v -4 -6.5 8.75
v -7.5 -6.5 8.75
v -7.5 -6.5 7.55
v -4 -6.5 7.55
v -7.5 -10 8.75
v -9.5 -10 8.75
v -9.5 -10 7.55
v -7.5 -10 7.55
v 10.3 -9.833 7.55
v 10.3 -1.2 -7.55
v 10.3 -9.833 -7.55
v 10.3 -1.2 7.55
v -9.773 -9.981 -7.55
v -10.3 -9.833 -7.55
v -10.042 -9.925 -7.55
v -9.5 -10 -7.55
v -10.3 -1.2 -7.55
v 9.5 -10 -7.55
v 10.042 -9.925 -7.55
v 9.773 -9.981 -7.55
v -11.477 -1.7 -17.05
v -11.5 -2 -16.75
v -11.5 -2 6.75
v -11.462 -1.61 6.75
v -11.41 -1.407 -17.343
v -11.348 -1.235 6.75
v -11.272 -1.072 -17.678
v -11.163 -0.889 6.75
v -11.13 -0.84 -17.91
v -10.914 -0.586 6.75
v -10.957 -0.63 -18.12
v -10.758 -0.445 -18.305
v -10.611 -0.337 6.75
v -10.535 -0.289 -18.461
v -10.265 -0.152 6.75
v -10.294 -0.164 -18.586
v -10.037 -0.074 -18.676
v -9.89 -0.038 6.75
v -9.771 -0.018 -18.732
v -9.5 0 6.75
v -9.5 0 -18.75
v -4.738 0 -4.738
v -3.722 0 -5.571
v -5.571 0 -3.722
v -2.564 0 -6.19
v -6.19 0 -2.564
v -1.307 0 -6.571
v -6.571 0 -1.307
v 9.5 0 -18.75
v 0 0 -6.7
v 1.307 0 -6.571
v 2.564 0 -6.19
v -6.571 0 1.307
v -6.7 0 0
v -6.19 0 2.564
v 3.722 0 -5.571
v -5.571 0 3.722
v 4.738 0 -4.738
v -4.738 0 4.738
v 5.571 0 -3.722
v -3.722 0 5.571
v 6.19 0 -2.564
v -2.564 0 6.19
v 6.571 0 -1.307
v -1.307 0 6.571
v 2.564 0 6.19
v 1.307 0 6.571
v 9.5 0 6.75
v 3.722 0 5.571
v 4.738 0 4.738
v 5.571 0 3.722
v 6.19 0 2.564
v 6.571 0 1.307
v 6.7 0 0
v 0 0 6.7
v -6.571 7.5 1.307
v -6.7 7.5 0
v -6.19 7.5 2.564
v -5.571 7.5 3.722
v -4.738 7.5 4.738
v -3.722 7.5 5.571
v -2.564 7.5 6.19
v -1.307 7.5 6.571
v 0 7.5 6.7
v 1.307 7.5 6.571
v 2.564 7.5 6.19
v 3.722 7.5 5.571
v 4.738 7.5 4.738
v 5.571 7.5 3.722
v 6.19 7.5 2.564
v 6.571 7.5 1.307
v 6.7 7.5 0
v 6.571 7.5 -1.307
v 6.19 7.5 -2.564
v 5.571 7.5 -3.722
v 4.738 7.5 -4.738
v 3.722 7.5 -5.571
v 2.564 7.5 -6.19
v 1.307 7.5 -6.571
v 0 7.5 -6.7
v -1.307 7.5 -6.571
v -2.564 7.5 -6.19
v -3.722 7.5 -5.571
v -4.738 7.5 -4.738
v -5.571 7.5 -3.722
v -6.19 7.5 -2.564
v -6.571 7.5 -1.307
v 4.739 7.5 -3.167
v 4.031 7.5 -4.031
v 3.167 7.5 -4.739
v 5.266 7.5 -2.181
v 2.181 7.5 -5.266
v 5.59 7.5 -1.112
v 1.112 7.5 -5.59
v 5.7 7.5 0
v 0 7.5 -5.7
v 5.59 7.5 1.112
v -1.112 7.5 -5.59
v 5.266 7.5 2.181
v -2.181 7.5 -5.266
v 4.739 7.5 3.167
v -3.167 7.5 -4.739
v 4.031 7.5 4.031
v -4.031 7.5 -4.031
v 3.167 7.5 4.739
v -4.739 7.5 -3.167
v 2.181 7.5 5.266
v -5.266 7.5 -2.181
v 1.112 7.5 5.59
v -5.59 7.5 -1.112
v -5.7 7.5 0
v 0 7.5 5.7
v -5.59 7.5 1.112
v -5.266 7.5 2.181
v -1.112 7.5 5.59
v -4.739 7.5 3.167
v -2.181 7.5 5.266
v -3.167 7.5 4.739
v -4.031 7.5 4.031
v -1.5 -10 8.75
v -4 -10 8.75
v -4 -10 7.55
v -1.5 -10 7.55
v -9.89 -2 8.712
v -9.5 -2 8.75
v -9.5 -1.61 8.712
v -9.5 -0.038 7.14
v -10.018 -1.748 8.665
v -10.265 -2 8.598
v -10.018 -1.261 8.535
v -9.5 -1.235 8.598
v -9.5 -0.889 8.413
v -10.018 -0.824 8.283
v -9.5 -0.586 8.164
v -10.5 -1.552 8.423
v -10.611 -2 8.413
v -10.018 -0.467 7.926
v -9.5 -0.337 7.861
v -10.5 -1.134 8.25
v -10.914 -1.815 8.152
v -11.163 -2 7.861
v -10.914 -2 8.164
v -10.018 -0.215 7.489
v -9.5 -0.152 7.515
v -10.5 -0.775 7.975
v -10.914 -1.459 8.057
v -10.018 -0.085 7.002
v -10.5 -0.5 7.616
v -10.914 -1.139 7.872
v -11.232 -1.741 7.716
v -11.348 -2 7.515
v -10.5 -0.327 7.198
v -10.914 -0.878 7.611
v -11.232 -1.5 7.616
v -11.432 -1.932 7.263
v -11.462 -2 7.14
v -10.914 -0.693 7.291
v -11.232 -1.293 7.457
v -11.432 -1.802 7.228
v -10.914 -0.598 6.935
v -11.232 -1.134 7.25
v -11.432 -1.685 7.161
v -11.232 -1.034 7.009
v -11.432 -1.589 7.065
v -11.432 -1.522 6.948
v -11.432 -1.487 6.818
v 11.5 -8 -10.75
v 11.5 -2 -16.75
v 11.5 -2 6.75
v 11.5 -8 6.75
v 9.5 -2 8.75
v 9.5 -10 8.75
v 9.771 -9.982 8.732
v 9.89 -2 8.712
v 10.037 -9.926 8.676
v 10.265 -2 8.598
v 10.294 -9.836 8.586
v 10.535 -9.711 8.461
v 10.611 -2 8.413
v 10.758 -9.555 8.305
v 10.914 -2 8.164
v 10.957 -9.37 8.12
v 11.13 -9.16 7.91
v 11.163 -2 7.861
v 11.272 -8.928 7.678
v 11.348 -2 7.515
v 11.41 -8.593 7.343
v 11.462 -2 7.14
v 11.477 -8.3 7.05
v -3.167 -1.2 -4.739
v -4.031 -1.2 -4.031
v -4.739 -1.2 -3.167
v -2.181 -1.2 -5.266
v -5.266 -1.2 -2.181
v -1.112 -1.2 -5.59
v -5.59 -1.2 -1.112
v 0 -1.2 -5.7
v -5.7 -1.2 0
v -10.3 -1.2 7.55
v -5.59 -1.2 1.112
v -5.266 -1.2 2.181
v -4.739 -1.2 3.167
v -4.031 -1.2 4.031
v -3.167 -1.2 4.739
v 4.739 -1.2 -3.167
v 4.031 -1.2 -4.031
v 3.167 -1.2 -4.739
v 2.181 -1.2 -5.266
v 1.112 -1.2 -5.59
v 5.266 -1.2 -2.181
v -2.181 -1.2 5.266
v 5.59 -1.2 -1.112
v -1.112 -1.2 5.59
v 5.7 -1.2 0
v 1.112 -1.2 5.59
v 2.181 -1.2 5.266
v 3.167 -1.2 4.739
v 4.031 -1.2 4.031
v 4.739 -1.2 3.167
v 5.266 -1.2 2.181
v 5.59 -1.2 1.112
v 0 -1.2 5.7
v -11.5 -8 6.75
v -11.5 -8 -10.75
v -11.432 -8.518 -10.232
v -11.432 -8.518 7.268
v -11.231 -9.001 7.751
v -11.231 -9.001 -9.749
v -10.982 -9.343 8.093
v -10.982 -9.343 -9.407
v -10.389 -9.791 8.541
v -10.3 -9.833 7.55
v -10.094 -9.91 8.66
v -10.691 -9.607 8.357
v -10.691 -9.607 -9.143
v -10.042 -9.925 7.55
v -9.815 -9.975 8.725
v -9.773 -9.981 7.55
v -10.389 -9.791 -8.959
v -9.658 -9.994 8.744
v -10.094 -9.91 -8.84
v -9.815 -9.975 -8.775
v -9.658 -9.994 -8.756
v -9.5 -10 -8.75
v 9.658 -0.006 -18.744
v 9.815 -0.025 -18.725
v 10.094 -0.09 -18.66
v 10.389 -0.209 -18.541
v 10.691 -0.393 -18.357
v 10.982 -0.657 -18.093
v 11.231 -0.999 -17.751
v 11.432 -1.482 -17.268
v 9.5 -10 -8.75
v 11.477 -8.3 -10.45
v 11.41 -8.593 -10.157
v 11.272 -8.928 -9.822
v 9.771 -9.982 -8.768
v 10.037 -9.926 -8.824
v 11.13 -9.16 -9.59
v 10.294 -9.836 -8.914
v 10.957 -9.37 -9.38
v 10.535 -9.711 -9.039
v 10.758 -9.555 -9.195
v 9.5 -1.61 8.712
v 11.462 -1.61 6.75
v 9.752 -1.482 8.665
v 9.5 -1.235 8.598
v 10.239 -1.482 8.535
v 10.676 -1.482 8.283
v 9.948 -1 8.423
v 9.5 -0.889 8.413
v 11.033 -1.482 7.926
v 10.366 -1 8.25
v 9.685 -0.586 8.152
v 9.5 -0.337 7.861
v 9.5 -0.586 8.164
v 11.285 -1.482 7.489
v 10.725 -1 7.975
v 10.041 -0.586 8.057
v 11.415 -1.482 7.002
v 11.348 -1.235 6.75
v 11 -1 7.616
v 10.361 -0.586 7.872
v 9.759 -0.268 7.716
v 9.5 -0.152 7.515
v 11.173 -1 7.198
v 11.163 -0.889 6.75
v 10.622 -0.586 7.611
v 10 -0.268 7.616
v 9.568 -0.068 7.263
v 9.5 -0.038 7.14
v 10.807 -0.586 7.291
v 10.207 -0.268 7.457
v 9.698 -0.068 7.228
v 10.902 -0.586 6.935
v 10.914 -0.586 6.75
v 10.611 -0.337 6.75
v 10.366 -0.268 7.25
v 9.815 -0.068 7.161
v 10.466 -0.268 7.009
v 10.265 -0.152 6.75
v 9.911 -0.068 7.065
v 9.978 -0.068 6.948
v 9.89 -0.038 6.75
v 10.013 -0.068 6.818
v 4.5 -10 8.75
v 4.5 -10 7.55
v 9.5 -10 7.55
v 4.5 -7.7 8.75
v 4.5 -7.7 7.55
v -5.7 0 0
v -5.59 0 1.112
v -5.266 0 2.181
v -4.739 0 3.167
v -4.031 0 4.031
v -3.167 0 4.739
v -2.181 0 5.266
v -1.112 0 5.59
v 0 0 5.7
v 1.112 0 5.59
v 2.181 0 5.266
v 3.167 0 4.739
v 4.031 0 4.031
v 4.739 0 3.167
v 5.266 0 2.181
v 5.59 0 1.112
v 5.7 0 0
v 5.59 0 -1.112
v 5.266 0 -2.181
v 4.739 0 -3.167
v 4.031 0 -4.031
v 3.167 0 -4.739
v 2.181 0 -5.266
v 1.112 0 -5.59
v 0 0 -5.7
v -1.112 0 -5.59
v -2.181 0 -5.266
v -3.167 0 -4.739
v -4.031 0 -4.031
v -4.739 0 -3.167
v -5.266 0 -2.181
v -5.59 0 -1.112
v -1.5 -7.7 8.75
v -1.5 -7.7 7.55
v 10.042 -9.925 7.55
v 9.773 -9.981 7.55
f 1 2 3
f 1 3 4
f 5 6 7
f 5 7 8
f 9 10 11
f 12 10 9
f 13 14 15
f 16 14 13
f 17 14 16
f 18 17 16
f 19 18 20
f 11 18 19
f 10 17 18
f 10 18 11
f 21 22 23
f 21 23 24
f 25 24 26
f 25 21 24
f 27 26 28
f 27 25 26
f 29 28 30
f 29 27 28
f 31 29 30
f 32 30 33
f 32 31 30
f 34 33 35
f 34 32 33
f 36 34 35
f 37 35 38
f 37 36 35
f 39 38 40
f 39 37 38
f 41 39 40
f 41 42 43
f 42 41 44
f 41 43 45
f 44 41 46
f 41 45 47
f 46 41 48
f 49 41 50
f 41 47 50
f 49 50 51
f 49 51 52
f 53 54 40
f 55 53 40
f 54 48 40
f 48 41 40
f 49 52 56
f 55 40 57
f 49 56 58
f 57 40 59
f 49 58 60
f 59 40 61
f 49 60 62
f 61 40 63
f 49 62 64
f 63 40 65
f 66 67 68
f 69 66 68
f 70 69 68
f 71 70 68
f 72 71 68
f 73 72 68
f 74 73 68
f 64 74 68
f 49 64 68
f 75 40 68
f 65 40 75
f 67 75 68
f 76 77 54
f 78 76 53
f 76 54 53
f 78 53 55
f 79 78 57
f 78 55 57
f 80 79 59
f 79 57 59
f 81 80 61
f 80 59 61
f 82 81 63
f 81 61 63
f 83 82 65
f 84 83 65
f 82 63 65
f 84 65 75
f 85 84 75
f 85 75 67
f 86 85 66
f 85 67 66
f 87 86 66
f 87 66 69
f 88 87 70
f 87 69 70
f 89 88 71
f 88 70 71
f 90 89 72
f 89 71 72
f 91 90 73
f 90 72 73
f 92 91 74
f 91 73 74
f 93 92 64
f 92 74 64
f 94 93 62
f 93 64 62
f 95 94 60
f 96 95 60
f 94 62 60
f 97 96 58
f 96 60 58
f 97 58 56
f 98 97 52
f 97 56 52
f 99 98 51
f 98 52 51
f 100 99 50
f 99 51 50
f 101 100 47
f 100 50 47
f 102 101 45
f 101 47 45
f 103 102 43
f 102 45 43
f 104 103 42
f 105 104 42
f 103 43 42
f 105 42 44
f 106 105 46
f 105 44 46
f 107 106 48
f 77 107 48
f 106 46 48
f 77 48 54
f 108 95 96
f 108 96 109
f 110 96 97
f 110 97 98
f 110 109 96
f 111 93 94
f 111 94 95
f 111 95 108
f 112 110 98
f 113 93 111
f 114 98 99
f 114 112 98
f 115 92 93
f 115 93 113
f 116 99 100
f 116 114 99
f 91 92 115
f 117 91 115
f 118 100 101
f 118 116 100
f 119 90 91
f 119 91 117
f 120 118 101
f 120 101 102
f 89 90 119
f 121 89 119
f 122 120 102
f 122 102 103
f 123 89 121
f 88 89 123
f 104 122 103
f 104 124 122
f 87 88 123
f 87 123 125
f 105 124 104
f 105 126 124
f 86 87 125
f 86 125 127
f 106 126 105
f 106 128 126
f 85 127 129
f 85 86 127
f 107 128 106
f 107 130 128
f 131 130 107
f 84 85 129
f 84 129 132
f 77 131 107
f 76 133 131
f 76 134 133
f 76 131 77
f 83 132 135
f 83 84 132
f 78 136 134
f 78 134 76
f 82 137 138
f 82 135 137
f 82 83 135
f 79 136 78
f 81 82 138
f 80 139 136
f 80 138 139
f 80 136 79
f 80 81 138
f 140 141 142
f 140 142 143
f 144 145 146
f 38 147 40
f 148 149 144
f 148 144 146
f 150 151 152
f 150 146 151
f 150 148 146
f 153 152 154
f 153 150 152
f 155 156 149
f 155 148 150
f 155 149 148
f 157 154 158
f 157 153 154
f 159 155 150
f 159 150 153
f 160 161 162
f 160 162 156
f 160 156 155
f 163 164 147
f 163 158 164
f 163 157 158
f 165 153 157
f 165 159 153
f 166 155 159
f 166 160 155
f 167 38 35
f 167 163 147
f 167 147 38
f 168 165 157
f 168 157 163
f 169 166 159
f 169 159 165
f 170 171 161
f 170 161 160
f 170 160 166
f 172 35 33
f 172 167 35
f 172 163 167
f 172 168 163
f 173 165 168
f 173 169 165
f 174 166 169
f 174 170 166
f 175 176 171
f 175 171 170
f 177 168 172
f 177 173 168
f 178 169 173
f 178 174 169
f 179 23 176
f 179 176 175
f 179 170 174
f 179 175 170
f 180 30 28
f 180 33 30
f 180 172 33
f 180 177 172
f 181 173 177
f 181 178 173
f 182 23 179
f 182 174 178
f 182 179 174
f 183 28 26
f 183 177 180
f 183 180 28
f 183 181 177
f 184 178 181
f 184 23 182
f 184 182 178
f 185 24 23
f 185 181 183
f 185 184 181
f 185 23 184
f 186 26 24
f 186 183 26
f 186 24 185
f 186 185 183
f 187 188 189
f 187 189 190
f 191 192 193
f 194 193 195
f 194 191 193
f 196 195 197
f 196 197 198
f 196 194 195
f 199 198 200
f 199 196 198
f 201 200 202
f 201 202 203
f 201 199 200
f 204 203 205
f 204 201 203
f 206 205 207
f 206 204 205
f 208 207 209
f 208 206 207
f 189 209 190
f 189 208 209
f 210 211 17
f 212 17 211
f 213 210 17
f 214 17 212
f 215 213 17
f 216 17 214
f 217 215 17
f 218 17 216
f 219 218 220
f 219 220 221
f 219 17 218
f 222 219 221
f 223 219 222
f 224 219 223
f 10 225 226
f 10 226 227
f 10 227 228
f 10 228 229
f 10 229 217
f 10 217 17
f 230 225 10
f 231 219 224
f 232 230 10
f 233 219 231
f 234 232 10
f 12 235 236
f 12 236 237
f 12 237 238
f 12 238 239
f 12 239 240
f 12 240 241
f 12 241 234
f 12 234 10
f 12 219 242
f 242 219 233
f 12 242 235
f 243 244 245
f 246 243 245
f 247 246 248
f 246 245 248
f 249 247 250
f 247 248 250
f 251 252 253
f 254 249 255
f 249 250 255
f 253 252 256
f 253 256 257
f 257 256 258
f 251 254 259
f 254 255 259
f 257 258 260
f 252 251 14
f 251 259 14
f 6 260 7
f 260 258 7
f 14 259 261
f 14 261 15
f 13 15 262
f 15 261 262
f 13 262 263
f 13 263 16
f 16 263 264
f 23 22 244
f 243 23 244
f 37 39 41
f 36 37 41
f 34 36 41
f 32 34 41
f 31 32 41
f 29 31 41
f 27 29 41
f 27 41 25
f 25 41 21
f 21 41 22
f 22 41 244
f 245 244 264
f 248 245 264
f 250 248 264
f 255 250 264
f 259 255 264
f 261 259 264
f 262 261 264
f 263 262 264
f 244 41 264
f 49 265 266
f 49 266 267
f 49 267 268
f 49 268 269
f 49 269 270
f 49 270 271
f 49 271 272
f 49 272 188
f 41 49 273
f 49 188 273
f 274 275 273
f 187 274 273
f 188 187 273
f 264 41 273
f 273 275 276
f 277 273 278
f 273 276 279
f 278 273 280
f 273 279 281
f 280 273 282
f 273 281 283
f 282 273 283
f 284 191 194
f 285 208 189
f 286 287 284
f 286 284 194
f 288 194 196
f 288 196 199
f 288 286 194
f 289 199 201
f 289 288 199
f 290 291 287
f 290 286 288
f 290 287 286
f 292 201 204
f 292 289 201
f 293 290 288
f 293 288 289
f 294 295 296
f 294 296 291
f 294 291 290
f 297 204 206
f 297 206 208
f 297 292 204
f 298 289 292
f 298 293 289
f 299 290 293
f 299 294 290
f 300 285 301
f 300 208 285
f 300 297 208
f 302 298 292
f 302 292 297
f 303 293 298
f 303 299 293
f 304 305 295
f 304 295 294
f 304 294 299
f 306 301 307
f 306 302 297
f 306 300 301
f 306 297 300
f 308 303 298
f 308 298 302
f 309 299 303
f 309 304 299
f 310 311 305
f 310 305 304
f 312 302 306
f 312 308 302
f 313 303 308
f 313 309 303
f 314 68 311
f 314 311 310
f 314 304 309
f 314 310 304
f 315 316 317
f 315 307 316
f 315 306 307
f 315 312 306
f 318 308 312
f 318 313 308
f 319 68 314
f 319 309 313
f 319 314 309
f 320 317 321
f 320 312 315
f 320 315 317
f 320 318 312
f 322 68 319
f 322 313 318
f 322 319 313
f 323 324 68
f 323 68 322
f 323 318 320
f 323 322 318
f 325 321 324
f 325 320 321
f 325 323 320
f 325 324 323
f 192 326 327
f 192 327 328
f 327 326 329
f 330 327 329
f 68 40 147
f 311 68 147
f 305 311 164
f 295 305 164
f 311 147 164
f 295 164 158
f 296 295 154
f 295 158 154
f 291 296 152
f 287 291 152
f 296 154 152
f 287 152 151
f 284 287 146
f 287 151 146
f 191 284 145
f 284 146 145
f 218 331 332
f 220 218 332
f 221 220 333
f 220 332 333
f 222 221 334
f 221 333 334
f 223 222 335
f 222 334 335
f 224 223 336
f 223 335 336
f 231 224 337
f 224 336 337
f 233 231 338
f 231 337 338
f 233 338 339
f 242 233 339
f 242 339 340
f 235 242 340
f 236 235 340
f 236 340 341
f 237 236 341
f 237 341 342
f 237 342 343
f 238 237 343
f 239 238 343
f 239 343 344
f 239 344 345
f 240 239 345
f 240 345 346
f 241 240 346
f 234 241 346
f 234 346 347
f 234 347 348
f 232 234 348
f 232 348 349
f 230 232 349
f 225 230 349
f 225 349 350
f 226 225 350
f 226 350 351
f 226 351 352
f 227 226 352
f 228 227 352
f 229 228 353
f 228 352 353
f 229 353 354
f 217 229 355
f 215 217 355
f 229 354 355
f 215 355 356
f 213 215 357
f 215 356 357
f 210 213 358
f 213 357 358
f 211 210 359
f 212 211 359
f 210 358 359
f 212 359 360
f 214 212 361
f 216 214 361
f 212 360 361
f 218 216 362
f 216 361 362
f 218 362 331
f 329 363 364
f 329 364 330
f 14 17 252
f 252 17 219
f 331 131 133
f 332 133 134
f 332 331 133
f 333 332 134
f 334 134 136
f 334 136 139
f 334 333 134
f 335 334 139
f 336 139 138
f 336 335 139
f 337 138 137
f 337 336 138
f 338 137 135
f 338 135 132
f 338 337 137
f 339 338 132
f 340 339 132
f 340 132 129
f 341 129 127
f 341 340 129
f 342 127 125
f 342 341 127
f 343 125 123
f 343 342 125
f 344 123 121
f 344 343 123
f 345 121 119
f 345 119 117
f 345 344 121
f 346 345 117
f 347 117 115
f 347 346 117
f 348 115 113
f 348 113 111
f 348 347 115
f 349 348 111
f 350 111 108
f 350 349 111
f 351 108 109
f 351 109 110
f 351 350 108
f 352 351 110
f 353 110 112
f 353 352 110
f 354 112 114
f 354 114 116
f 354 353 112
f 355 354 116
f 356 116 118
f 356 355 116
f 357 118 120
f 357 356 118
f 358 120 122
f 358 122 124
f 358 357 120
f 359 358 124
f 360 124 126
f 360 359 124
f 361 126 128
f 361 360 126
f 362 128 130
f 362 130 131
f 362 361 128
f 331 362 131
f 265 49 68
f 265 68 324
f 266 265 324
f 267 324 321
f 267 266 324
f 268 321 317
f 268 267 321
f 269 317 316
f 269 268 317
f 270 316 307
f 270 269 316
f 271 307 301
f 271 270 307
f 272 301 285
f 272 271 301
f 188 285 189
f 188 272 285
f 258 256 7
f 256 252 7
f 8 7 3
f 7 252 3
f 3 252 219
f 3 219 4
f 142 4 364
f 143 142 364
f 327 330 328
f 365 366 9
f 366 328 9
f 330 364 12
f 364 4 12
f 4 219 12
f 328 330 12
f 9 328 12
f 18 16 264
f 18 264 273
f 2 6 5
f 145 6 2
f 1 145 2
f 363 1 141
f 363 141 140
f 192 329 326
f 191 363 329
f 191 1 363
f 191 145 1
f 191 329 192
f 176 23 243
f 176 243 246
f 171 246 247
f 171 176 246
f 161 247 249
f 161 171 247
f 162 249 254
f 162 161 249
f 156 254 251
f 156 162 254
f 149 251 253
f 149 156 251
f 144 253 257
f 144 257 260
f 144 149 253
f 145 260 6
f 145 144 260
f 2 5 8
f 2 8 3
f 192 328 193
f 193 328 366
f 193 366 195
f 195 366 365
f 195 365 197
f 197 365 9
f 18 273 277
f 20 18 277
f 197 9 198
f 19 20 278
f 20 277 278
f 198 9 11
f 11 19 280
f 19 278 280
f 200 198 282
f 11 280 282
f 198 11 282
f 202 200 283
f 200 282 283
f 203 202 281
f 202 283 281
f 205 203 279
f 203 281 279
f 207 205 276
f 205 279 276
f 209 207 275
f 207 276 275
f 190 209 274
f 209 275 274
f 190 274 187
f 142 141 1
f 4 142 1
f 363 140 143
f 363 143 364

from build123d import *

# Parameters (mm, degrees)
F0_W          = 23
F0_H          = 17.5
F1_DEPTH      = 10
F2_T          = -1.2
F3_R          = 5.7
F4_DEPTH      = 3
F3_R_2        = 6.7
F5_DEPTH      = 7.5
F6_W          = 6
F6_H          = 2.3
F6_W_2        = 3.5
F6_H_2        = 3.5
F7_DEPTH      = 4
F8_DEPTH      = 10
F10_DEPTH     = 30
F11_T1_DEPTH  = 19
F11_T3_DEPTH  = 30.5
F11_T5_DEPTH  = 13
F11_T7_DEPTH  = 27.5
F11_S11_W     = 2
F11_S11_H     = 2
F11_T12_DEPTH = 2
F11_S17_W     = 2
F11_S17_H     = 2
F11_T18_DEPTH = 2


# Not quite as in the source:
# - a fillet or chamfer that OpenCascade refuses, or shapes differently, is made with other operations: its cross-section is extruded or revolved along the edge and cut away or added


with BuildPart() as f1:
    # F0 (on Front) → F1 (new body)
    with BuildSketch(Plane.XZ):
        Rectangle(F0_W, F0_H)
    extrude(amount=F1_DEPTH)

    # F2
    f2_openings = [f1.faces().sort_by_distance(p)[0] for p in [
        (0, -10, 0),
    ]]
    offset(amount=F2_T, openings=f2_openings)

    # F3 (on face) → F4 (cut)
    with BuildSketch(Plane(origin=(0, 0, 0), x_dir=(-1, 0, 0), z_dir=(0, 1, 0))):
        Circle(F3_R)
    extrude(amount=-F4_DEPTH, mode=Mode.SUBTRACT)

    # F3 (on face) → F5 (join)
    with BuildSketch(Plane(origin=(0, 0, 0), x_dir=(-1, 0, 0), z_dir=(0, 1, 0))):
        Circle(F3_R_2)
        Circle(F3_R, mode=Mode.SUBTRACT)
    extrude(amount=F5_DEPTH)

    # F6 (on face) → F7 (cut)
    with BuildSketch(Plane.XY.offset(8.75)):
        with Locations((1.5, -8.85)):
            Rectangle(F6_W, F6_H)
        with Locations((-5.75, -8.25)):
            Rectangle(F6_W_2, F6_H_2)
    extrude(amount=-F7_DEPTH, mode=Mode.SUBTRACT)

    # F8 (add): a face of the model
    f8_faces = [f1.faces().sort_by_distance(p)[0] for p in [
        (0, -5, -8.75),
    ]]
    extrude(f8_faces, amount=F8_DEPTH)

    # F9 (on face) → F10 (cut)
    with BuildSketch(Plane.YZ.offset(11.5)):
        Polygon((-10, -18.75), (0, -18.75), (-10, -8.75), align=None)
    extrude(amount=-F10_DEPTH, mode=Mode.SUBTRACT)

    # F11: fillet of radius 2 on 7 edges, made by hand

    # F11_s2 → F11_t1 (cut)
    with BuildSketch(Plane.YZ.offset(-9.5)):
        with BuildLine():
            ThreePointArc((0, 6.75), (-0.5857864376, 8.1642135624), (-2, 8.75))
            Line((-2, 8.75), (0, 8.75))
            Line((0, 8.75), (0, 6.75))
        make_face()
    extrude(amount=F11_T1_DEPTH, mode=Mode.SUBTRACT)

    # F11_s4 → F11_t3 (cut)
    with BuildSketch(Plane.XY.offset(-23.75)):
        with BuildLine():
            ThreePointArc((-11.5, -2), (-10.9142135624, -0.5857864376), (-9.5, 0))
            Line((-9.5, 0), (-11.5, 0))
            Line((-11.5, 0), (-11.5, -2))
        make_face()
        with BuildLine():
            ThreePointArc((9.5, 0), (10.9142135624, -0.5857864376), (11.5, -2))
            Line((11.5, -2), (11.5, 0))
            Line((11.5, 0), (9.5, 0))
        make_face()
    extrude(amount=F11_T3_DEPTH, mode=Mode.SUBTRACT)

    # F11_s6 → F11_t5 (cut)
    with BuildSketch(Plane.XZ.offset(2)):
        with BuildLine():
            ThreePointArc((9.5, 8.75), (10.9142135624, 8.1642135624), (11.5, 6.75))
            Line((11.5, 6.75), (11.5, 8.75))
            Line((11.5, 8.75), (9.5, 8.75))
        make_face()
        with BuildLine():
            ThreePointArc((-11.5, 6.75), (-10.9142135624, 8.1642135624), (-9.5, 8.75))
            Line((-9.5, 8.75), (-11.5, 8.75))
            Line((-11.5, 8.75), (-11.5, 6.75))
        make_face()
    extrude(amount=F11_T5_DEPTH, mode=Mode.SUBTRACT)

    # F11_s8 → F11_t7 (cut)
    with BuildSketch(Plane.XY.offset(-13.75)):
        with BuildLine():
            ThreePointArc((9.5, -10), (10.9142135624, -9.4142135624), (11.5, -8))
            Line((11.5, -8), (11.5, -10))
            Line((11.5, -10), (9.5, -10))
        make_face()
        with BuildLine():
            ThreePointArc((-11.5, -8), (-10.9142135624, -9.4142135624), (-9.5, -10))
            Line((-9.5, -10), (-11.5, -10))
            Line((-11.5, -10), (-11.5, -8))
        make_face()
    extrude(amount=F11_T7_DEPTH, mode=Mode.SUBTRACT)


with BuildPart() as f11_tool10:
    # F11_s11 → F11_t12 (new body)
    with BuildSketch(Plane.XZ.offset(2)):
        with Locations((10.5, 7.75)):
            Rectangle(F11_S11_W, F11_S11_H)
    extrude(amount=-F11_T12_DEPTH)

    # F11_s13 → F11_t14 (revolve, cut)
    with BuildSketch(Plane(origin=(9.5, -2, 6.75), x_dir=(-0.7071067812, 0, -0.7071067812), z_dir=(0.7071067812, 0, -0.7071067812))):
        with BuildLine():
            ThreePointArc((0, -2), (2, 0), (0, 2))
            Line((0, 2), (0, -2))
        make_face()
    revolve(axis=Axis((9.5, -2, 6.75), (0, 1, 0)), mode=Mode.SUBTRACT)


with BuildPart() as f1_1:
    add(f1.part)

    # F11_t9: cut F11_tool10
    add(f11_tool10.part, mode=Mode.SUBTRACT)


with BuildPart() as f11_tool16:
    # F11_s17 → F11_t18 (new body)
    with BuildSketch(Plane.YZ.offset(-9.5)):
        with Locations((-1, 7.75)):
            Rectangle(F11_S17_W, F11_S17_H)
    extrude(amount=-F11_T18_DEPTH)

    # F11_s19 → F11_t20 (revolve, cut)
    with BuildSketch(Plane(origin=(-9.5, -2, 6.75), x_dir=(0, -0.7071067812, -0.7071067812), z_dir=(0, 0.7071067812, -0.7071067812))):
        with BuildLine():
            ThreePointArc((0, -2), (2, 0), (0, 2))
            Line((0, 2), (0, -2))
        make_face()
    revolve(axis=Axis((-9.5, -2, 6.75), (-1, 0, 0)), mode=Mode.SUBTRACT)


with BuildPart() as f1_2:
    add(f1_1.part)

    # F11_t15: cut F11_tool16
    add(f11_tool16.part, mode=Mode.SUBTRACT)


solid = f1_2.part
